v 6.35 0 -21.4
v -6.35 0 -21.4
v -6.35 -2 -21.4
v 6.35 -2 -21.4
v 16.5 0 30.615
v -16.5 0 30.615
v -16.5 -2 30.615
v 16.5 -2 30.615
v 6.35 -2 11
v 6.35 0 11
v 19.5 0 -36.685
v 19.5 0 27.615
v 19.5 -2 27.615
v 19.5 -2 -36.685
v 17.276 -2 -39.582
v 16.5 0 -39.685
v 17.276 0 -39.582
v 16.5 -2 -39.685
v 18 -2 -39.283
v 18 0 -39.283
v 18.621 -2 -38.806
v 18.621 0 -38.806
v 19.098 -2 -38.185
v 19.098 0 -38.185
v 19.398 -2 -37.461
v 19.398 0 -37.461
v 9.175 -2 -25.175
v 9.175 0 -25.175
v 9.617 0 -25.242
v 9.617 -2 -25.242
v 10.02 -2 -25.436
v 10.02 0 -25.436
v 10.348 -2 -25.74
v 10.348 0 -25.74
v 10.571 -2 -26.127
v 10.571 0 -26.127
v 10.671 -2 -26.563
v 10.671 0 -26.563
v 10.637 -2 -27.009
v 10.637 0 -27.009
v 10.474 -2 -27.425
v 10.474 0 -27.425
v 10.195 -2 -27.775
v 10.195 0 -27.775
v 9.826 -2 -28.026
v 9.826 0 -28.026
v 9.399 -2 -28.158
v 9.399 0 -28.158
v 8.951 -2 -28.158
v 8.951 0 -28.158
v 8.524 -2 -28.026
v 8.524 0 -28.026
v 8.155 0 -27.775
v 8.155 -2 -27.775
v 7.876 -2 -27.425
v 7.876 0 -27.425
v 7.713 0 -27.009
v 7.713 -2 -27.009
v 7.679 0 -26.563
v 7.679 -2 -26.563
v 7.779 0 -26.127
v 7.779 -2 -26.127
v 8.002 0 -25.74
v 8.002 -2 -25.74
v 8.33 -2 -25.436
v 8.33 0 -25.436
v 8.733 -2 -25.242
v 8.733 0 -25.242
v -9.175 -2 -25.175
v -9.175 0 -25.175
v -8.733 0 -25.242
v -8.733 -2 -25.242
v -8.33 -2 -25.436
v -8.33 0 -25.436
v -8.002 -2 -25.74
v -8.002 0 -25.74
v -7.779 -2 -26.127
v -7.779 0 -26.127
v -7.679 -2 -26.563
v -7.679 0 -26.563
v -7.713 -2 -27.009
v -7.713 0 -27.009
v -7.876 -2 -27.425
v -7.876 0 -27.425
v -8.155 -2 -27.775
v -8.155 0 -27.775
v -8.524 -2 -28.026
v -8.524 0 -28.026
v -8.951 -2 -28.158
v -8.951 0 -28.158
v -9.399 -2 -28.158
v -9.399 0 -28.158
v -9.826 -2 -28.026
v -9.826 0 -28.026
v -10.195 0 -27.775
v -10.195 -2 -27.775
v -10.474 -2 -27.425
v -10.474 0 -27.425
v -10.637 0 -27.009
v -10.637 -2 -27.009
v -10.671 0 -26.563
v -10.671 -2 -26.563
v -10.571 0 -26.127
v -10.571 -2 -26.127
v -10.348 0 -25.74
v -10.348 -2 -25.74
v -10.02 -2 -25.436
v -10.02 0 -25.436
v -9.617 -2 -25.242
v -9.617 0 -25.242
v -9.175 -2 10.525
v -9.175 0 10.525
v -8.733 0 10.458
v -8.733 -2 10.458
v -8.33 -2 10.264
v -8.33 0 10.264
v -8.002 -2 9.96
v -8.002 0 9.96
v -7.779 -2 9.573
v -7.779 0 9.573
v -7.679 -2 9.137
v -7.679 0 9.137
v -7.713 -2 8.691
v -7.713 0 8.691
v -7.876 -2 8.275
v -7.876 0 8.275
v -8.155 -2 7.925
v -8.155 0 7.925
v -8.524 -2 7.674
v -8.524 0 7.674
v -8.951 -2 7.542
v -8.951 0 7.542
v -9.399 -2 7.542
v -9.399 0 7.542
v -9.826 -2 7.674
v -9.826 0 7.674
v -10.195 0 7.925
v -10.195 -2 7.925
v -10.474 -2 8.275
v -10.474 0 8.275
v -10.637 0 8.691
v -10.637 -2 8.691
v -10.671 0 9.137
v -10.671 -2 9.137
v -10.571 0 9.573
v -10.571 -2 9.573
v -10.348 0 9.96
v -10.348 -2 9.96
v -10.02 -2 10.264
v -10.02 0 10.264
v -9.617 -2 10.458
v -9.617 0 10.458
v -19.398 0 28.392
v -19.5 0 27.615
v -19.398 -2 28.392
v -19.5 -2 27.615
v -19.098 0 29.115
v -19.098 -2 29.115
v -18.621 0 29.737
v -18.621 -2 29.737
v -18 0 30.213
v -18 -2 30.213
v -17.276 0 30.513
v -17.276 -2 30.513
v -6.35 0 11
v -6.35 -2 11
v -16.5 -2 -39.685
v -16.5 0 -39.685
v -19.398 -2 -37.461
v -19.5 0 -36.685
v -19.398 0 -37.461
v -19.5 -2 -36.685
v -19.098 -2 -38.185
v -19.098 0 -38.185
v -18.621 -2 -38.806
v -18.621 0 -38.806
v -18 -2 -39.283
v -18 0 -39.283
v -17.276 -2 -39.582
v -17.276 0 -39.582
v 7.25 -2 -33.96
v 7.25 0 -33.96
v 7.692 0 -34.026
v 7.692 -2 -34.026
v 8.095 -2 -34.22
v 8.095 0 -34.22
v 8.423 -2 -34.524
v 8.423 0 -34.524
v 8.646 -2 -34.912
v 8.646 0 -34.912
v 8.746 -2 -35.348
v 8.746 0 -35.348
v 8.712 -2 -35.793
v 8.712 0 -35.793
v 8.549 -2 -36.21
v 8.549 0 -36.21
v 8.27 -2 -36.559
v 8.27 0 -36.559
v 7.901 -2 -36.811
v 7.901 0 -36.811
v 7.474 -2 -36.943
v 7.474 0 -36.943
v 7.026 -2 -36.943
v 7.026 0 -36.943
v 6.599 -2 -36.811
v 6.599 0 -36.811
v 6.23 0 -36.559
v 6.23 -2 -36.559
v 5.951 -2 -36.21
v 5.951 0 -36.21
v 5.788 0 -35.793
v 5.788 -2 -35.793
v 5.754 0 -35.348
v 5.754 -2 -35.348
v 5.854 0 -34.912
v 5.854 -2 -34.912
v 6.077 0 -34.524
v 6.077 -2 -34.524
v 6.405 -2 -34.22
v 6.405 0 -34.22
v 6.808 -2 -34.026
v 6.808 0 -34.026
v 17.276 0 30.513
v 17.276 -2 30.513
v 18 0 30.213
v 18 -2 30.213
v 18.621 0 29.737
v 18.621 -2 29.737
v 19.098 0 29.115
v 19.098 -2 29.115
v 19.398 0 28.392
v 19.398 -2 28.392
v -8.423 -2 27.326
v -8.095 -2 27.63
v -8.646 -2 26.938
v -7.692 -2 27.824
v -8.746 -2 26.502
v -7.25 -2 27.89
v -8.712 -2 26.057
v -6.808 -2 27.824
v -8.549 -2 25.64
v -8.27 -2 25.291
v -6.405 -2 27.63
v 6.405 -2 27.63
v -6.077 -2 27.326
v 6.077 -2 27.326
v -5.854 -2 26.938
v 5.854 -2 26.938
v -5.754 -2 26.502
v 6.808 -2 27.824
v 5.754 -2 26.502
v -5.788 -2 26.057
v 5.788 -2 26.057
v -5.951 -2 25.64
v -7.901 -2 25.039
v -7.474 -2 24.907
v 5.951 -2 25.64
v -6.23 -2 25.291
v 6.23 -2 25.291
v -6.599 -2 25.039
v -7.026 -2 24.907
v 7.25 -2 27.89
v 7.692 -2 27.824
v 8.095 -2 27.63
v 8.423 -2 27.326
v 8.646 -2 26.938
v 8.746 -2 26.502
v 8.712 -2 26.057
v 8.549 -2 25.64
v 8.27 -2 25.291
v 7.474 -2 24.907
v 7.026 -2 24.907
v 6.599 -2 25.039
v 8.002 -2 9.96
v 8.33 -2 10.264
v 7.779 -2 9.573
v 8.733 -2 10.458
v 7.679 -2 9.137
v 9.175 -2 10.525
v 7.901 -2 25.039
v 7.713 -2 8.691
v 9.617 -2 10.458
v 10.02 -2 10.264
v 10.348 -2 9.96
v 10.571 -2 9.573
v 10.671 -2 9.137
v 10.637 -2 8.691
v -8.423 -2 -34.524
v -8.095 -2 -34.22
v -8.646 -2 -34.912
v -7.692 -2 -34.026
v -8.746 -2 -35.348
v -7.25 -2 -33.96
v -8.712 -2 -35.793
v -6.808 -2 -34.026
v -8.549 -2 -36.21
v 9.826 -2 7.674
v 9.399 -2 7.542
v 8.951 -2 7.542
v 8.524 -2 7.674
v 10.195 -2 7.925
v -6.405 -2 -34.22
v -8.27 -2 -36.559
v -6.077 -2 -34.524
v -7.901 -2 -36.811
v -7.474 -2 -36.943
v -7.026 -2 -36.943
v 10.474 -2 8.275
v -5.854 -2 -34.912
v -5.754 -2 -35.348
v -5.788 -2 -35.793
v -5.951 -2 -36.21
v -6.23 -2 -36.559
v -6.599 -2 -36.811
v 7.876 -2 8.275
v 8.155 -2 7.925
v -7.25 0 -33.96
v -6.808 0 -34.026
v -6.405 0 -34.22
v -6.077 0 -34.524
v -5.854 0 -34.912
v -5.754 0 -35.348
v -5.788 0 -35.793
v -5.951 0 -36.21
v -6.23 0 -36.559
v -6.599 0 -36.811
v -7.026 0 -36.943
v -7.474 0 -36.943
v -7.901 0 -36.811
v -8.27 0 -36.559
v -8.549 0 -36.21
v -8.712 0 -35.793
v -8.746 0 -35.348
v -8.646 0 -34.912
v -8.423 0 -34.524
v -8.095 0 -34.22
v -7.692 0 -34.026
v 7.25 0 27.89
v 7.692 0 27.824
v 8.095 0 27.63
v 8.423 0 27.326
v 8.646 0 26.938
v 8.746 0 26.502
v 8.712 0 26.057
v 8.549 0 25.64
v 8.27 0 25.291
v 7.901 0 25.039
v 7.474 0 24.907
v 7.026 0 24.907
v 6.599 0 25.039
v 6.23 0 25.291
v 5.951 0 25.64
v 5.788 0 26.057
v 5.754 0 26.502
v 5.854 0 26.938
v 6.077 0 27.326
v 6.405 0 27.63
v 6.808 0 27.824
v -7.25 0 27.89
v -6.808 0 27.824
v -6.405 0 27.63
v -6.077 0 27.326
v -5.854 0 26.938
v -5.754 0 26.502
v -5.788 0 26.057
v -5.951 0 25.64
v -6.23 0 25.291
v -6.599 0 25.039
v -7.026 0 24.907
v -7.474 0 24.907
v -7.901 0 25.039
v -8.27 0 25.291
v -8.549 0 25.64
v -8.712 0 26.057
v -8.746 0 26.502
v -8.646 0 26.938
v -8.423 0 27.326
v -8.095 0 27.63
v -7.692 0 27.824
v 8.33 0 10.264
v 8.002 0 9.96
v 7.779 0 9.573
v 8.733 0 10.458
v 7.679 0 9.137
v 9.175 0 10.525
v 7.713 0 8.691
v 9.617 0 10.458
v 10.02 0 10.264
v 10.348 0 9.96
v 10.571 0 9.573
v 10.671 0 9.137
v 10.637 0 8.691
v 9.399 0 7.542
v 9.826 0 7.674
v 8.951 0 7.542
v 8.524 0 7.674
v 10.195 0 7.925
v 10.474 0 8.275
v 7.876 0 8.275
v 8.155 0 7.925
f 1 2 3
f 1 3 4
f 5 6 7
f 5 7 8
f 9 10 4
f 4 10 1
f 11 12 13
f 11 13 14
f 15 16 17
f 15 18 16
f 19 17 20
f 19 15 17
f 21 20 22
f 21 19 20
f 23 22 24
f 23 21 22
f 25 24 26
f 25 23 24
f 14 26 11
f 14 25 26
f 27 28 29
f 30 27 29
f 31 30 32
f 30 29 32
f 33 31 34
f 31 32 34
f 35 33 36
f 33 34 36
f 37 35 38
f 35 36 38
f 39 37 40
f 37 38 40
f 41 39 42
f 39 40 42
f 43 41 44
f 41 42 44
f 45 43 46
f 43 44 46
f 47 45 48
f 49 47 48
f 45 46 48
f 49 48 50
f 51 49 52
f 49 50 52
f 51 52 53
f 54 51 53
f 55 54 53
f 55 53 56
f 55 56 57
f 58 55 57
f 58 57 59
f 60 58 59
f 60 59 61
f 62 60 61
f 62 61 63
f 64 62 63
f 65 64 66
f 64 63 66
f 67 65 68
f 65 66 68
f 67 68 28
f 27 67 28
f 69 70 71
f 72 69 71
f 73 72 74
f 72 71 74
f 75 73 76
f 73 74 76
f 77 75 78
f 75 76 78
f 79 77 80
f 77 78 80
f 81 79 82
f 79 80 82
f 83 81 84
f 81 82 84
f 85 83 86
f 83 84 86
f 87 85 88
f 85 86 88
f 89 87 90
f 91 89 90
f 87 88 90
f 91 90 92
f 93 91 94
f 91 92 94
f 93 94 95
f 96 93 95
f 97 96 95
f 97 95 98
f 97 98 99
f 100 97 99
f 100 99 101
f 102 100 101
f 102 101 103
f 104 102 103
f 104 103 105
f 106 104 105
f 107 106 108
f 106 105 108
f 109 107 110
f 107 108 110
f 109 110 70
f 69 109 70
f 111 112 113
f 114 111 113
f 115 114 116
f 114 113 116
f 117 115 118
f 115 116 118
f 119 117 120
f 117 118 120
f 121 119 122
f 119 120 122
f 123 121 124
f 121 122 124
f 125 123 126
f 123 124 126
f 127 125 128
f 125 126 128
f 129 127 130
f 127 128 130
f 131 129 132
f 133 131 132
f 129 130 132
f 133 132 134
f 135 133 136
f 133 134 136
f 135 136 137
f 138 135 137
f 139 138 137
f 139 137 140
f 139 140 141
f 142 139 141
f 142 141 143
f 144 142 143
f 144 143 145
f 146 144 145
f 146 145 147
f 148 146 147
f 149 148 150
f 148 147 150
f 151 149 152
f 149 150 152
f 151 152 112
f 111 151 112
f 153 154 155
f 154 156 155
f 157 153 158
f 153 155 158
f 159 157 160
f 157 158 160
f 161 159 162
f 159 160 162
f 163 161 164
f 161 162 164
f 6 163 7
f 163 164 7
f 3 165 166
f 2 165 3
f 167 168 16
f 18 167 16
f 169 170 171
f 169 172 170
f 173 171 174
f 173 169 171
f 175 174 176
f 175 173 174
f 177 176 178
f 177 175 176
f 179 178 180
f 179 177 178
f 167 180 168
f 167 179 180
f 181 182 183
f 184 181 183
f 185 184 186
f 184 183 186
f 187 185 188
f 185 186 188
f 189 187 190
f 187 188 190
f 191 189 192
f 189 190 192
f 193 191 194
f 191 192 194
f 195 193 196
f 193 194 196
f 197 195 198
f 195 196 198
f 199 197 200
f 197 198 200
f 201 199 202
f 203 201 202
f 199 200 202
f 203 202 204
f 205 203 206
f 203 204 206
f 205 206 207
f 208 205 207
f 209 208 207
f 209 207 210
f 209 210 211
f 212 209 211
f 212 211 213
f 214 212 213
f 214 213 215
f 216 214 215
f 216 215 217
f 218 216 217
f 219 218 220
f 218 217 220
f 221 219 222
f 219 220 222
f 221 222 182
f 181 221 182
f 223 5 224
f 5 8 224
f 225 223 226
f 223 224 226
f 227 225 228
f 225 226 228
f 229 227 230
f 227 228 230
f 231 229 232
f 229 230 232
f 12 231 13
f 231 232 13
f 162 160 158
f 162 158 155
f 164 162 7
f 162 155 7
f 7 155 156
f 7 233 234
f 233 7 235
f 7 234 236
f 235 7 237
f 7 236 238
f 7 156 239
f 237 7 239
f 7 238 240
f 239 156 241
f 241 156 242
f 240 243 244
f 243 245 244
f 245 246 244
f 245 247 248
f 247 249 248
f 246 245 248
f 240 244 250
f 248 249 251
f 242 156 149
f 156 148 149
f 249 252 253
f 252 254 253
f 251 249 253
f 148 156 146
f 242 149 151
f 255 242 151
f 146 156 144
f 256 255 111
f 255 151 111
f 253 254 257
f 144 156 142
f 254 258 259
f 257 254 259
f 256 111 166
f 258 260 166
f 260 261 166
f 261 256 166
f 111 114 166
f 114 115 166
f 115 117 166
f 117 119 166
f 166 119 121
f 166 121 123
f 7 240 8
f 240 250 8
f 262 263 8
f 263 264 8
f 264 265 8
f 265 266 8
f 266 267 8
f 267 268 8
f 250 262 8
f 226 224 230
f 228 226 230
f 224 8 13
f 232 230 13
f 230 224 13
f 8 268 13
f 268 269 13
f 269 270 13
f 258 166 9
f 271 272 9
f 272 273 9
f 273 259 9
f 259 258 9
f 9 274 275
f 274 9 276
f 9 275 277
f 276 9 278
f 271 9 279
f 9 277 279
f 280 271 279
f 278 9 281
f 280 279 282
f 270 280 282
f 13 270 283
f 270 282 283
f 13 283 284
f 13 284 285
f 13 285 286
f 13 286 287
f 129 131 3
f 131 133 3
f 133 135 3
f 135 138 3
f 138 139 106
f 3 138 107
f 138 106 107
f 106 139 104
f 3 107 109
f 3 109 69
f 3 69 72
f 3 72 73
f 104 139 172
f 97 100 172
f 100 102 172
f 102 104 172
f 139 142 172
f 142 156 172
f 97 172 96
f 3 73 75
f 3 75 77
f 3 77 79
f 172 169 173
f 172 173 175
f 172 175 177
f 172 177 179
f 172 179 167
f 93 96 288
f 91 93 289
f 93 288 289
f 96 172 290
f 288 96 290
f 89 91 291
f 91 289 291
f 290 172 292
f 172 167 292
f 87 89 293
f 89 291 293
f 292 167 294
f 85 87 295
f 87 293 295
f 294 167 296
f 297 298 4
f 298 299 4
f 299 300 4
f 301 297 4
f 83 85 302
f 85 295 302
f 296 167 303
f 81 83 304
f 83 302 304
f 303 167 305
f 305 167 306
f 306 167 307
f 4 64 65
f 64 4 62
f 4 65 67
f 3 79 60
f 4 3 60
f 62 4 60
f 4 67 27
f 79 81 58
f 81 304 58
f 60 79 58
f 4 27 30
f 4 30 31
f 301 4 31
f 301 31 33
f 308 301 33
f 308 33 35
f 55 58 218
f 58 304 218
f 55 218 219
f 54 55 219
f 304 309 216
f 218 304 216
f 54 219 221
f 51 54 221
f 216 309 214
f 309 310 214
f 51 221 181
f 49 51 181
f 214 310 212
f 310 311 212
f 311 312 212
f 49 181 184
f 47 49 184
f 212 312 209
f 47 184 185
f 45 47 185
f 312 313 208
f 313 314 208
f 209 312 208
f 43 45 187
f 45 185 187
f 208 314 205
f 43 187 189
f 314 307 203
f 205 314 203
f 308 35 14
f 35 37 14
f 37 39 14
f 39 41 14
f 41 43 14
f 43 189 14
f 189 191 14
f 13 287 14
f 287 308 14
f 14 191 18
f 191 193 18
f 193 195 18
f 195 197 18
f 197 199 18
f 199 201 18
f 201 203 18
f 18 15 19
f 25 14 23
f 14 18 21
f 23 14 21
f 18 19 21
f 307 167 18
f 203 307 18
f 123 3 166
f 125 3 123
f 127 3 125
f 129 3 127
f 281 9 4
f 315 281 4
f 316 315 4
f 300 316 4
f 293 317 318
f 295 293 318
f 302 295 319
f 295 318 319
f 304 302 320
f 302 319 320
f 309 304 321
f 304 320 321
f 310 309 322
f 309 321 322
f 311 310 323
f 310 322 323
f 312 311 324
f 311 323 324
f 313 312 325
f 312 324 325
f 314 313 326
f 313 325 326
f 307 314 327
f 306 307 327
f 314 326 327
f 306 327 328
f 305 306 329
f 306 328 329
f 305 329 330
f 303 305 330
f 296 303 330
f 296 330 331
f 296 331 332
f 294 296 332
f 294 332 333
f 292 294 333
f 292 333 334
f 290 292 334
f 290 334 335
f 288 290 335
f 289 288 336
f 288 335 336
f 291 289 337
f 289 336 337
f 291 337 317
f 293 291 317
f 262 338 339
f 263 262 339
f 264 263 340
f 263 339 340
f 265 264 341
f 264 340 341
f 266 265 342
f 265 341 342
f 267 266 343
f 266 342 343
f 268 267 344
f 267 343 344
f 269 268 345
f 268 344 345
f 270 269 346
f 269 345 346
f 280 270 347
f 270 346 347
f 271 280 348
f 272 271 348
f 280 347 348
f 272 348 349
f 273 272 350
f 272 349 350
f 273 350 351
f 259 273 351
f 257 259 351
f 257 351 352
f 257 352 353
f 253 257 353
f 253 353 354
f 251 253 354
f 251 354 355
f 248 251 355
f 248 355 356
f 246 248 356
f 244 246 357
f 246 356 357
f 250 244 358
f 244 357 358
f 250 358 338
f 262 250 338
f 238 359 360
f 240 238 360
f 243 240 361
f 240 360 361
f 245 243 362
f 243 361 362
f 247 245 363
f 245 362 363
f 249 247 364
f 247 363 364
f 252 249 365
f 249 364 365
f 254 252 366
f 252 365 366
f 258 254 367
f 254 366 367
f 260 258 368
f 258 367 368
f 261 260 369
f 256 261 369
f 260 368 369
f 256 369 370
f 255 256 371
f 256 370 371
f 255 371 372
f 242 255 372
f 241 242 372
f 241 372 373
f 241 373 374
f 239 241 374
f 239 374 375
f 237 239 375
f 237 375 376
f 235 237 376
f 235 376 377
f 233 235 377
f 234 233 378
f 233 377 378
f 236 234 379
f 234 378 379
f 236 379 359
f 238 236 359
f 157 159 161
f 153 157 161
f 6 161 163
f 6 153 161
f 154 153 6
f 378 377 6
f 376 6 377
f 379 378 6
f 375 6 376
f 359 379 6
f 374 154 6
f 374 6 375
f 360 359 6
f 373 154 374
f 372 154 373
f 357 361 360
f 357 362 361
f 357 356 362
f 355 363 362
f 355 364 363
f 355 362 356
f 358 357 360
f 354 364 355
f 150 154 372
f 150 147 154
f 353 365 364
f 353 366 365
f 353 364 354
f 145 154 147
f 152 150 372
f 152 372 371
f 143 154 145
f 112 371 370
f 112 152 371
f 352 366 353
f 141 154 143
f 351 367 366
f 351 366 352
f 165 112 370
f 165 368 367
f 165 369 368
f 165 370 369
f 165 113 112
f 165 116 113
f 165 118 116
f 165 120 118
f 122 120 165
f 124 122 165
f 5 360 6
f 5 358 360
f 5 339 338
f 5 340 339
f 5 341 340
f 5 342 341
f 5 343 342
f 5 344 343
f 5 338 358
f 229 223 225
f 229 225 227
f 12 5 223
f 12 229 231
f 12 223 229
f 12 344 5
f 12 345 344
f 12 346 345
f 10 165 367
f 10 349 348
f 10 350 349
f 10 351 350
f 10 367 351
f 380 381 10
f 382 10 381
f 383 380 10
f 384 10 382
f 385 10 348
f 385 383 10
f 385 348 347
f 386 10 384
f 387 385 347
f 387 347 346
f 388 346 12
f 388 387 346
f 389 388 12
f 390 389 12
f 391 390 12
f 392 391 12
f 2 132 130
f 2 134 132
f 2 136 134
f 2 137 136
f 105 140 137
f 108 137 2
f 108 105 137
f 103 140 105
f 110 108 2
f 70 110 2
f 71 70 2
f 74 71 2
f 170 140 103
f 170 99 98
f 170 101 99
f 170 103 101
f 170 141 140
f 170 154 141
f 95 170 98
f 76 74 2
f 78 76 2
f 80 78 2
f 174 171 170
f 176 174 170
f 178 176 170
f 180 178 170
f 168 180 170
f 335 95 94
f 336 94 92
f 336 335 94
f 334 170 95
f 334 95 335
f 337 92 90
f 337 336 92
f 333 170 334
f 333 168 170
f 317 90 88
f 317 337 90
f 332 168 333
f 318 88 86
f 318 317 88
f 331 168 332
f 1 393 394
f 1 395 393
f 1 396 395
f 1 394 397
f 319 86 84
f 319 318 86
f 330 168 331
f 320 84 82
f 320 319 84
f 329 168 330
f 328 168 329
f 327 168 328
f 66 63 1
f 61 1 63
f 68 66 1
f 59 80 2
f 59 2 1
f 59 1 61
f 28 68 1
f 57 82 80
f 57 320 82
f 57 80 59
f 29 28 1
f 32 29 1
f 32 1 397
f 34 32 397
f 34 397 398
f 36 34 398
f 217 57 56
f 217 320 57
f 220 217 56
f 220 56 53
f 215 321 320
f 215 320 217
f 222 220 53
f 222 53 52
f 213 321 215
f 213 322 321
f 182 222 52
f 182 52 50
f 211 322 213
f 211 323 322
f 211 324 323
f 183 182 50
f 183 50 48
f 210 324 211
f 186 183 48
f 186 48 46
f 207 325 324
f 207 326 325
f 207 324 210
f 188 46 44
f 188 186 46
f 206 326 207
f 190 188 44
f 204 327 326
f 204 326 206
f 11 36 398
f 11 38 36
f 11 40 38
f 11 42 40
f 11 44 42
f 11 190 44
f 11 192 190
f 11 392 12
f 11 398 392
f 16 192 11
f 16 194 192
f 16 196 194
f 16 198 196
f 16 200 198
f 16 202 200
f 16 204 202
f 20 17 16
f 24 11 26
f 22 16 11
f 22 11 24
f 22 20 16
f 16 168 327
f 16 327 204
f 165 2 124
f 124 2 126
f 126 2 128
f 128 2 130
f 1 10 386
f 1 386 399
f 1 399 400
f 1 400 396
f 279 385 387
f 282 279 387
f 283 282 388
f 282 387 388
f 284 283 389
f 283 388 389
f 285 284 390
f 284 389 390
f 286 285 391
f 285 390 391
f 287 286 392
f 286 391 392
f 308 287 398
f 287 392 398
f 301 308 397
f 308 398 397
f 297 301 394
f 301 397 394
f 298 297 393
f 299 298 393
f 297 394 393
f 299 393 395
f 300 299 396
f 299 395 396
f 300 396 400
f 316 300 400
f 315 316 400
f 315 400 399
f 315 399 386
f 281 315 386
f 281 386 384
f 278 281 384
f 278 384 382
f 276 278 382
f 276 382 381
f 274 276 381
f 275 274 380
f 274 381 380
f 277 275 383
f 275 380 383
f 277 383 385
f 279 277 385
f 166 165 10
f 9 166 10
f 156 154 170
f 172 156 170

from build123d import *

# Parameters (mm, degrees)
SKETCH3_W           = 39
SKETCH3_H           = 70.3
SKETCH3_R           = 1.5
SKETCH3_W_2         = 12.7
SKETCH3_H_2         = 32.4
BOSS_EXTRUDE1_DEPTH = 2
FILLET1_R           = 3


with BuildPart() as part:
    # Sketch3 → Boss-Extrude1 (new body)
    with BuildSketch(Plane(origin=(0, 0, 0), x_dir=(1, 0, 0), z_dir=(0, 1, 0))):
        with Locations((0, 4.534618943)):
            Rectangle(SKETCH3_W, SKETCH3_H)
        with Locations(Location((-7.25, 35.459618943, 0), (0, 0, 270))):
            Circle(SKETCH3_R, mode=Mode.SUBTRACT)
        with Locations(Location((7.25, 35.459618943, 0), (0, 0, 270))):
            Circle(SKETCH3_R, mode=Mode.SUBTRACT)
        with Locations(Location((7.25, -26.390381057, 0), (0, 0, 270))):
            Circle(SKETCH3_R, mode=Mode.SUBTRACT)
        with Locations(Location((-7.25, -26.390381057, 0), (0, 0, 270))):
            Circle(SKETCH3_R, mode=Mode.SUBTRACT)
        with Locations(Location((9.175, 26.675, 0), (0, 0, 270))):
            Circle(SKETCH3_R, mode=Mode.SUBTRACT)
        with Locations(Location((9.175, -9.025, 0), (0, 0, 270))):
            Circle(SKETCH3_R, mode=Mode.SUBTRACT)
        with Locations(Location((-9.175, 26.675, 0), (0, 0, 270))):
            Circle(SKETCH3_R, mode=Mode.SUBTRACT)
        with Locations(Location((-9.175, -9.025, 0), (0, 0, 270))):
            Circle(SKETCH3_R, mode=Mode.SUBTRACT)
        with Locations((0, 5.2)):
            Rectangle(SKETCH3_W_2, SKETCH3_H_2, mode=Mode.SUBTRACT)
    extrude(amount=-BOSS_EXTRUDE1_DEPTH)

    # Fillet1
    fillet1_edges = [part.edges().sort_by_distance(p)[0] for p in [
        (-19.5, -1, -39.684618943),
        (19.5, -1, -39.684618943),
        (19.5, -1, 30.615381057),
        (-19.5, -1, 30.615381057),
    ]]
    fillet(fillet1_edges, radius=FILLET1_R)


solid = part.part
